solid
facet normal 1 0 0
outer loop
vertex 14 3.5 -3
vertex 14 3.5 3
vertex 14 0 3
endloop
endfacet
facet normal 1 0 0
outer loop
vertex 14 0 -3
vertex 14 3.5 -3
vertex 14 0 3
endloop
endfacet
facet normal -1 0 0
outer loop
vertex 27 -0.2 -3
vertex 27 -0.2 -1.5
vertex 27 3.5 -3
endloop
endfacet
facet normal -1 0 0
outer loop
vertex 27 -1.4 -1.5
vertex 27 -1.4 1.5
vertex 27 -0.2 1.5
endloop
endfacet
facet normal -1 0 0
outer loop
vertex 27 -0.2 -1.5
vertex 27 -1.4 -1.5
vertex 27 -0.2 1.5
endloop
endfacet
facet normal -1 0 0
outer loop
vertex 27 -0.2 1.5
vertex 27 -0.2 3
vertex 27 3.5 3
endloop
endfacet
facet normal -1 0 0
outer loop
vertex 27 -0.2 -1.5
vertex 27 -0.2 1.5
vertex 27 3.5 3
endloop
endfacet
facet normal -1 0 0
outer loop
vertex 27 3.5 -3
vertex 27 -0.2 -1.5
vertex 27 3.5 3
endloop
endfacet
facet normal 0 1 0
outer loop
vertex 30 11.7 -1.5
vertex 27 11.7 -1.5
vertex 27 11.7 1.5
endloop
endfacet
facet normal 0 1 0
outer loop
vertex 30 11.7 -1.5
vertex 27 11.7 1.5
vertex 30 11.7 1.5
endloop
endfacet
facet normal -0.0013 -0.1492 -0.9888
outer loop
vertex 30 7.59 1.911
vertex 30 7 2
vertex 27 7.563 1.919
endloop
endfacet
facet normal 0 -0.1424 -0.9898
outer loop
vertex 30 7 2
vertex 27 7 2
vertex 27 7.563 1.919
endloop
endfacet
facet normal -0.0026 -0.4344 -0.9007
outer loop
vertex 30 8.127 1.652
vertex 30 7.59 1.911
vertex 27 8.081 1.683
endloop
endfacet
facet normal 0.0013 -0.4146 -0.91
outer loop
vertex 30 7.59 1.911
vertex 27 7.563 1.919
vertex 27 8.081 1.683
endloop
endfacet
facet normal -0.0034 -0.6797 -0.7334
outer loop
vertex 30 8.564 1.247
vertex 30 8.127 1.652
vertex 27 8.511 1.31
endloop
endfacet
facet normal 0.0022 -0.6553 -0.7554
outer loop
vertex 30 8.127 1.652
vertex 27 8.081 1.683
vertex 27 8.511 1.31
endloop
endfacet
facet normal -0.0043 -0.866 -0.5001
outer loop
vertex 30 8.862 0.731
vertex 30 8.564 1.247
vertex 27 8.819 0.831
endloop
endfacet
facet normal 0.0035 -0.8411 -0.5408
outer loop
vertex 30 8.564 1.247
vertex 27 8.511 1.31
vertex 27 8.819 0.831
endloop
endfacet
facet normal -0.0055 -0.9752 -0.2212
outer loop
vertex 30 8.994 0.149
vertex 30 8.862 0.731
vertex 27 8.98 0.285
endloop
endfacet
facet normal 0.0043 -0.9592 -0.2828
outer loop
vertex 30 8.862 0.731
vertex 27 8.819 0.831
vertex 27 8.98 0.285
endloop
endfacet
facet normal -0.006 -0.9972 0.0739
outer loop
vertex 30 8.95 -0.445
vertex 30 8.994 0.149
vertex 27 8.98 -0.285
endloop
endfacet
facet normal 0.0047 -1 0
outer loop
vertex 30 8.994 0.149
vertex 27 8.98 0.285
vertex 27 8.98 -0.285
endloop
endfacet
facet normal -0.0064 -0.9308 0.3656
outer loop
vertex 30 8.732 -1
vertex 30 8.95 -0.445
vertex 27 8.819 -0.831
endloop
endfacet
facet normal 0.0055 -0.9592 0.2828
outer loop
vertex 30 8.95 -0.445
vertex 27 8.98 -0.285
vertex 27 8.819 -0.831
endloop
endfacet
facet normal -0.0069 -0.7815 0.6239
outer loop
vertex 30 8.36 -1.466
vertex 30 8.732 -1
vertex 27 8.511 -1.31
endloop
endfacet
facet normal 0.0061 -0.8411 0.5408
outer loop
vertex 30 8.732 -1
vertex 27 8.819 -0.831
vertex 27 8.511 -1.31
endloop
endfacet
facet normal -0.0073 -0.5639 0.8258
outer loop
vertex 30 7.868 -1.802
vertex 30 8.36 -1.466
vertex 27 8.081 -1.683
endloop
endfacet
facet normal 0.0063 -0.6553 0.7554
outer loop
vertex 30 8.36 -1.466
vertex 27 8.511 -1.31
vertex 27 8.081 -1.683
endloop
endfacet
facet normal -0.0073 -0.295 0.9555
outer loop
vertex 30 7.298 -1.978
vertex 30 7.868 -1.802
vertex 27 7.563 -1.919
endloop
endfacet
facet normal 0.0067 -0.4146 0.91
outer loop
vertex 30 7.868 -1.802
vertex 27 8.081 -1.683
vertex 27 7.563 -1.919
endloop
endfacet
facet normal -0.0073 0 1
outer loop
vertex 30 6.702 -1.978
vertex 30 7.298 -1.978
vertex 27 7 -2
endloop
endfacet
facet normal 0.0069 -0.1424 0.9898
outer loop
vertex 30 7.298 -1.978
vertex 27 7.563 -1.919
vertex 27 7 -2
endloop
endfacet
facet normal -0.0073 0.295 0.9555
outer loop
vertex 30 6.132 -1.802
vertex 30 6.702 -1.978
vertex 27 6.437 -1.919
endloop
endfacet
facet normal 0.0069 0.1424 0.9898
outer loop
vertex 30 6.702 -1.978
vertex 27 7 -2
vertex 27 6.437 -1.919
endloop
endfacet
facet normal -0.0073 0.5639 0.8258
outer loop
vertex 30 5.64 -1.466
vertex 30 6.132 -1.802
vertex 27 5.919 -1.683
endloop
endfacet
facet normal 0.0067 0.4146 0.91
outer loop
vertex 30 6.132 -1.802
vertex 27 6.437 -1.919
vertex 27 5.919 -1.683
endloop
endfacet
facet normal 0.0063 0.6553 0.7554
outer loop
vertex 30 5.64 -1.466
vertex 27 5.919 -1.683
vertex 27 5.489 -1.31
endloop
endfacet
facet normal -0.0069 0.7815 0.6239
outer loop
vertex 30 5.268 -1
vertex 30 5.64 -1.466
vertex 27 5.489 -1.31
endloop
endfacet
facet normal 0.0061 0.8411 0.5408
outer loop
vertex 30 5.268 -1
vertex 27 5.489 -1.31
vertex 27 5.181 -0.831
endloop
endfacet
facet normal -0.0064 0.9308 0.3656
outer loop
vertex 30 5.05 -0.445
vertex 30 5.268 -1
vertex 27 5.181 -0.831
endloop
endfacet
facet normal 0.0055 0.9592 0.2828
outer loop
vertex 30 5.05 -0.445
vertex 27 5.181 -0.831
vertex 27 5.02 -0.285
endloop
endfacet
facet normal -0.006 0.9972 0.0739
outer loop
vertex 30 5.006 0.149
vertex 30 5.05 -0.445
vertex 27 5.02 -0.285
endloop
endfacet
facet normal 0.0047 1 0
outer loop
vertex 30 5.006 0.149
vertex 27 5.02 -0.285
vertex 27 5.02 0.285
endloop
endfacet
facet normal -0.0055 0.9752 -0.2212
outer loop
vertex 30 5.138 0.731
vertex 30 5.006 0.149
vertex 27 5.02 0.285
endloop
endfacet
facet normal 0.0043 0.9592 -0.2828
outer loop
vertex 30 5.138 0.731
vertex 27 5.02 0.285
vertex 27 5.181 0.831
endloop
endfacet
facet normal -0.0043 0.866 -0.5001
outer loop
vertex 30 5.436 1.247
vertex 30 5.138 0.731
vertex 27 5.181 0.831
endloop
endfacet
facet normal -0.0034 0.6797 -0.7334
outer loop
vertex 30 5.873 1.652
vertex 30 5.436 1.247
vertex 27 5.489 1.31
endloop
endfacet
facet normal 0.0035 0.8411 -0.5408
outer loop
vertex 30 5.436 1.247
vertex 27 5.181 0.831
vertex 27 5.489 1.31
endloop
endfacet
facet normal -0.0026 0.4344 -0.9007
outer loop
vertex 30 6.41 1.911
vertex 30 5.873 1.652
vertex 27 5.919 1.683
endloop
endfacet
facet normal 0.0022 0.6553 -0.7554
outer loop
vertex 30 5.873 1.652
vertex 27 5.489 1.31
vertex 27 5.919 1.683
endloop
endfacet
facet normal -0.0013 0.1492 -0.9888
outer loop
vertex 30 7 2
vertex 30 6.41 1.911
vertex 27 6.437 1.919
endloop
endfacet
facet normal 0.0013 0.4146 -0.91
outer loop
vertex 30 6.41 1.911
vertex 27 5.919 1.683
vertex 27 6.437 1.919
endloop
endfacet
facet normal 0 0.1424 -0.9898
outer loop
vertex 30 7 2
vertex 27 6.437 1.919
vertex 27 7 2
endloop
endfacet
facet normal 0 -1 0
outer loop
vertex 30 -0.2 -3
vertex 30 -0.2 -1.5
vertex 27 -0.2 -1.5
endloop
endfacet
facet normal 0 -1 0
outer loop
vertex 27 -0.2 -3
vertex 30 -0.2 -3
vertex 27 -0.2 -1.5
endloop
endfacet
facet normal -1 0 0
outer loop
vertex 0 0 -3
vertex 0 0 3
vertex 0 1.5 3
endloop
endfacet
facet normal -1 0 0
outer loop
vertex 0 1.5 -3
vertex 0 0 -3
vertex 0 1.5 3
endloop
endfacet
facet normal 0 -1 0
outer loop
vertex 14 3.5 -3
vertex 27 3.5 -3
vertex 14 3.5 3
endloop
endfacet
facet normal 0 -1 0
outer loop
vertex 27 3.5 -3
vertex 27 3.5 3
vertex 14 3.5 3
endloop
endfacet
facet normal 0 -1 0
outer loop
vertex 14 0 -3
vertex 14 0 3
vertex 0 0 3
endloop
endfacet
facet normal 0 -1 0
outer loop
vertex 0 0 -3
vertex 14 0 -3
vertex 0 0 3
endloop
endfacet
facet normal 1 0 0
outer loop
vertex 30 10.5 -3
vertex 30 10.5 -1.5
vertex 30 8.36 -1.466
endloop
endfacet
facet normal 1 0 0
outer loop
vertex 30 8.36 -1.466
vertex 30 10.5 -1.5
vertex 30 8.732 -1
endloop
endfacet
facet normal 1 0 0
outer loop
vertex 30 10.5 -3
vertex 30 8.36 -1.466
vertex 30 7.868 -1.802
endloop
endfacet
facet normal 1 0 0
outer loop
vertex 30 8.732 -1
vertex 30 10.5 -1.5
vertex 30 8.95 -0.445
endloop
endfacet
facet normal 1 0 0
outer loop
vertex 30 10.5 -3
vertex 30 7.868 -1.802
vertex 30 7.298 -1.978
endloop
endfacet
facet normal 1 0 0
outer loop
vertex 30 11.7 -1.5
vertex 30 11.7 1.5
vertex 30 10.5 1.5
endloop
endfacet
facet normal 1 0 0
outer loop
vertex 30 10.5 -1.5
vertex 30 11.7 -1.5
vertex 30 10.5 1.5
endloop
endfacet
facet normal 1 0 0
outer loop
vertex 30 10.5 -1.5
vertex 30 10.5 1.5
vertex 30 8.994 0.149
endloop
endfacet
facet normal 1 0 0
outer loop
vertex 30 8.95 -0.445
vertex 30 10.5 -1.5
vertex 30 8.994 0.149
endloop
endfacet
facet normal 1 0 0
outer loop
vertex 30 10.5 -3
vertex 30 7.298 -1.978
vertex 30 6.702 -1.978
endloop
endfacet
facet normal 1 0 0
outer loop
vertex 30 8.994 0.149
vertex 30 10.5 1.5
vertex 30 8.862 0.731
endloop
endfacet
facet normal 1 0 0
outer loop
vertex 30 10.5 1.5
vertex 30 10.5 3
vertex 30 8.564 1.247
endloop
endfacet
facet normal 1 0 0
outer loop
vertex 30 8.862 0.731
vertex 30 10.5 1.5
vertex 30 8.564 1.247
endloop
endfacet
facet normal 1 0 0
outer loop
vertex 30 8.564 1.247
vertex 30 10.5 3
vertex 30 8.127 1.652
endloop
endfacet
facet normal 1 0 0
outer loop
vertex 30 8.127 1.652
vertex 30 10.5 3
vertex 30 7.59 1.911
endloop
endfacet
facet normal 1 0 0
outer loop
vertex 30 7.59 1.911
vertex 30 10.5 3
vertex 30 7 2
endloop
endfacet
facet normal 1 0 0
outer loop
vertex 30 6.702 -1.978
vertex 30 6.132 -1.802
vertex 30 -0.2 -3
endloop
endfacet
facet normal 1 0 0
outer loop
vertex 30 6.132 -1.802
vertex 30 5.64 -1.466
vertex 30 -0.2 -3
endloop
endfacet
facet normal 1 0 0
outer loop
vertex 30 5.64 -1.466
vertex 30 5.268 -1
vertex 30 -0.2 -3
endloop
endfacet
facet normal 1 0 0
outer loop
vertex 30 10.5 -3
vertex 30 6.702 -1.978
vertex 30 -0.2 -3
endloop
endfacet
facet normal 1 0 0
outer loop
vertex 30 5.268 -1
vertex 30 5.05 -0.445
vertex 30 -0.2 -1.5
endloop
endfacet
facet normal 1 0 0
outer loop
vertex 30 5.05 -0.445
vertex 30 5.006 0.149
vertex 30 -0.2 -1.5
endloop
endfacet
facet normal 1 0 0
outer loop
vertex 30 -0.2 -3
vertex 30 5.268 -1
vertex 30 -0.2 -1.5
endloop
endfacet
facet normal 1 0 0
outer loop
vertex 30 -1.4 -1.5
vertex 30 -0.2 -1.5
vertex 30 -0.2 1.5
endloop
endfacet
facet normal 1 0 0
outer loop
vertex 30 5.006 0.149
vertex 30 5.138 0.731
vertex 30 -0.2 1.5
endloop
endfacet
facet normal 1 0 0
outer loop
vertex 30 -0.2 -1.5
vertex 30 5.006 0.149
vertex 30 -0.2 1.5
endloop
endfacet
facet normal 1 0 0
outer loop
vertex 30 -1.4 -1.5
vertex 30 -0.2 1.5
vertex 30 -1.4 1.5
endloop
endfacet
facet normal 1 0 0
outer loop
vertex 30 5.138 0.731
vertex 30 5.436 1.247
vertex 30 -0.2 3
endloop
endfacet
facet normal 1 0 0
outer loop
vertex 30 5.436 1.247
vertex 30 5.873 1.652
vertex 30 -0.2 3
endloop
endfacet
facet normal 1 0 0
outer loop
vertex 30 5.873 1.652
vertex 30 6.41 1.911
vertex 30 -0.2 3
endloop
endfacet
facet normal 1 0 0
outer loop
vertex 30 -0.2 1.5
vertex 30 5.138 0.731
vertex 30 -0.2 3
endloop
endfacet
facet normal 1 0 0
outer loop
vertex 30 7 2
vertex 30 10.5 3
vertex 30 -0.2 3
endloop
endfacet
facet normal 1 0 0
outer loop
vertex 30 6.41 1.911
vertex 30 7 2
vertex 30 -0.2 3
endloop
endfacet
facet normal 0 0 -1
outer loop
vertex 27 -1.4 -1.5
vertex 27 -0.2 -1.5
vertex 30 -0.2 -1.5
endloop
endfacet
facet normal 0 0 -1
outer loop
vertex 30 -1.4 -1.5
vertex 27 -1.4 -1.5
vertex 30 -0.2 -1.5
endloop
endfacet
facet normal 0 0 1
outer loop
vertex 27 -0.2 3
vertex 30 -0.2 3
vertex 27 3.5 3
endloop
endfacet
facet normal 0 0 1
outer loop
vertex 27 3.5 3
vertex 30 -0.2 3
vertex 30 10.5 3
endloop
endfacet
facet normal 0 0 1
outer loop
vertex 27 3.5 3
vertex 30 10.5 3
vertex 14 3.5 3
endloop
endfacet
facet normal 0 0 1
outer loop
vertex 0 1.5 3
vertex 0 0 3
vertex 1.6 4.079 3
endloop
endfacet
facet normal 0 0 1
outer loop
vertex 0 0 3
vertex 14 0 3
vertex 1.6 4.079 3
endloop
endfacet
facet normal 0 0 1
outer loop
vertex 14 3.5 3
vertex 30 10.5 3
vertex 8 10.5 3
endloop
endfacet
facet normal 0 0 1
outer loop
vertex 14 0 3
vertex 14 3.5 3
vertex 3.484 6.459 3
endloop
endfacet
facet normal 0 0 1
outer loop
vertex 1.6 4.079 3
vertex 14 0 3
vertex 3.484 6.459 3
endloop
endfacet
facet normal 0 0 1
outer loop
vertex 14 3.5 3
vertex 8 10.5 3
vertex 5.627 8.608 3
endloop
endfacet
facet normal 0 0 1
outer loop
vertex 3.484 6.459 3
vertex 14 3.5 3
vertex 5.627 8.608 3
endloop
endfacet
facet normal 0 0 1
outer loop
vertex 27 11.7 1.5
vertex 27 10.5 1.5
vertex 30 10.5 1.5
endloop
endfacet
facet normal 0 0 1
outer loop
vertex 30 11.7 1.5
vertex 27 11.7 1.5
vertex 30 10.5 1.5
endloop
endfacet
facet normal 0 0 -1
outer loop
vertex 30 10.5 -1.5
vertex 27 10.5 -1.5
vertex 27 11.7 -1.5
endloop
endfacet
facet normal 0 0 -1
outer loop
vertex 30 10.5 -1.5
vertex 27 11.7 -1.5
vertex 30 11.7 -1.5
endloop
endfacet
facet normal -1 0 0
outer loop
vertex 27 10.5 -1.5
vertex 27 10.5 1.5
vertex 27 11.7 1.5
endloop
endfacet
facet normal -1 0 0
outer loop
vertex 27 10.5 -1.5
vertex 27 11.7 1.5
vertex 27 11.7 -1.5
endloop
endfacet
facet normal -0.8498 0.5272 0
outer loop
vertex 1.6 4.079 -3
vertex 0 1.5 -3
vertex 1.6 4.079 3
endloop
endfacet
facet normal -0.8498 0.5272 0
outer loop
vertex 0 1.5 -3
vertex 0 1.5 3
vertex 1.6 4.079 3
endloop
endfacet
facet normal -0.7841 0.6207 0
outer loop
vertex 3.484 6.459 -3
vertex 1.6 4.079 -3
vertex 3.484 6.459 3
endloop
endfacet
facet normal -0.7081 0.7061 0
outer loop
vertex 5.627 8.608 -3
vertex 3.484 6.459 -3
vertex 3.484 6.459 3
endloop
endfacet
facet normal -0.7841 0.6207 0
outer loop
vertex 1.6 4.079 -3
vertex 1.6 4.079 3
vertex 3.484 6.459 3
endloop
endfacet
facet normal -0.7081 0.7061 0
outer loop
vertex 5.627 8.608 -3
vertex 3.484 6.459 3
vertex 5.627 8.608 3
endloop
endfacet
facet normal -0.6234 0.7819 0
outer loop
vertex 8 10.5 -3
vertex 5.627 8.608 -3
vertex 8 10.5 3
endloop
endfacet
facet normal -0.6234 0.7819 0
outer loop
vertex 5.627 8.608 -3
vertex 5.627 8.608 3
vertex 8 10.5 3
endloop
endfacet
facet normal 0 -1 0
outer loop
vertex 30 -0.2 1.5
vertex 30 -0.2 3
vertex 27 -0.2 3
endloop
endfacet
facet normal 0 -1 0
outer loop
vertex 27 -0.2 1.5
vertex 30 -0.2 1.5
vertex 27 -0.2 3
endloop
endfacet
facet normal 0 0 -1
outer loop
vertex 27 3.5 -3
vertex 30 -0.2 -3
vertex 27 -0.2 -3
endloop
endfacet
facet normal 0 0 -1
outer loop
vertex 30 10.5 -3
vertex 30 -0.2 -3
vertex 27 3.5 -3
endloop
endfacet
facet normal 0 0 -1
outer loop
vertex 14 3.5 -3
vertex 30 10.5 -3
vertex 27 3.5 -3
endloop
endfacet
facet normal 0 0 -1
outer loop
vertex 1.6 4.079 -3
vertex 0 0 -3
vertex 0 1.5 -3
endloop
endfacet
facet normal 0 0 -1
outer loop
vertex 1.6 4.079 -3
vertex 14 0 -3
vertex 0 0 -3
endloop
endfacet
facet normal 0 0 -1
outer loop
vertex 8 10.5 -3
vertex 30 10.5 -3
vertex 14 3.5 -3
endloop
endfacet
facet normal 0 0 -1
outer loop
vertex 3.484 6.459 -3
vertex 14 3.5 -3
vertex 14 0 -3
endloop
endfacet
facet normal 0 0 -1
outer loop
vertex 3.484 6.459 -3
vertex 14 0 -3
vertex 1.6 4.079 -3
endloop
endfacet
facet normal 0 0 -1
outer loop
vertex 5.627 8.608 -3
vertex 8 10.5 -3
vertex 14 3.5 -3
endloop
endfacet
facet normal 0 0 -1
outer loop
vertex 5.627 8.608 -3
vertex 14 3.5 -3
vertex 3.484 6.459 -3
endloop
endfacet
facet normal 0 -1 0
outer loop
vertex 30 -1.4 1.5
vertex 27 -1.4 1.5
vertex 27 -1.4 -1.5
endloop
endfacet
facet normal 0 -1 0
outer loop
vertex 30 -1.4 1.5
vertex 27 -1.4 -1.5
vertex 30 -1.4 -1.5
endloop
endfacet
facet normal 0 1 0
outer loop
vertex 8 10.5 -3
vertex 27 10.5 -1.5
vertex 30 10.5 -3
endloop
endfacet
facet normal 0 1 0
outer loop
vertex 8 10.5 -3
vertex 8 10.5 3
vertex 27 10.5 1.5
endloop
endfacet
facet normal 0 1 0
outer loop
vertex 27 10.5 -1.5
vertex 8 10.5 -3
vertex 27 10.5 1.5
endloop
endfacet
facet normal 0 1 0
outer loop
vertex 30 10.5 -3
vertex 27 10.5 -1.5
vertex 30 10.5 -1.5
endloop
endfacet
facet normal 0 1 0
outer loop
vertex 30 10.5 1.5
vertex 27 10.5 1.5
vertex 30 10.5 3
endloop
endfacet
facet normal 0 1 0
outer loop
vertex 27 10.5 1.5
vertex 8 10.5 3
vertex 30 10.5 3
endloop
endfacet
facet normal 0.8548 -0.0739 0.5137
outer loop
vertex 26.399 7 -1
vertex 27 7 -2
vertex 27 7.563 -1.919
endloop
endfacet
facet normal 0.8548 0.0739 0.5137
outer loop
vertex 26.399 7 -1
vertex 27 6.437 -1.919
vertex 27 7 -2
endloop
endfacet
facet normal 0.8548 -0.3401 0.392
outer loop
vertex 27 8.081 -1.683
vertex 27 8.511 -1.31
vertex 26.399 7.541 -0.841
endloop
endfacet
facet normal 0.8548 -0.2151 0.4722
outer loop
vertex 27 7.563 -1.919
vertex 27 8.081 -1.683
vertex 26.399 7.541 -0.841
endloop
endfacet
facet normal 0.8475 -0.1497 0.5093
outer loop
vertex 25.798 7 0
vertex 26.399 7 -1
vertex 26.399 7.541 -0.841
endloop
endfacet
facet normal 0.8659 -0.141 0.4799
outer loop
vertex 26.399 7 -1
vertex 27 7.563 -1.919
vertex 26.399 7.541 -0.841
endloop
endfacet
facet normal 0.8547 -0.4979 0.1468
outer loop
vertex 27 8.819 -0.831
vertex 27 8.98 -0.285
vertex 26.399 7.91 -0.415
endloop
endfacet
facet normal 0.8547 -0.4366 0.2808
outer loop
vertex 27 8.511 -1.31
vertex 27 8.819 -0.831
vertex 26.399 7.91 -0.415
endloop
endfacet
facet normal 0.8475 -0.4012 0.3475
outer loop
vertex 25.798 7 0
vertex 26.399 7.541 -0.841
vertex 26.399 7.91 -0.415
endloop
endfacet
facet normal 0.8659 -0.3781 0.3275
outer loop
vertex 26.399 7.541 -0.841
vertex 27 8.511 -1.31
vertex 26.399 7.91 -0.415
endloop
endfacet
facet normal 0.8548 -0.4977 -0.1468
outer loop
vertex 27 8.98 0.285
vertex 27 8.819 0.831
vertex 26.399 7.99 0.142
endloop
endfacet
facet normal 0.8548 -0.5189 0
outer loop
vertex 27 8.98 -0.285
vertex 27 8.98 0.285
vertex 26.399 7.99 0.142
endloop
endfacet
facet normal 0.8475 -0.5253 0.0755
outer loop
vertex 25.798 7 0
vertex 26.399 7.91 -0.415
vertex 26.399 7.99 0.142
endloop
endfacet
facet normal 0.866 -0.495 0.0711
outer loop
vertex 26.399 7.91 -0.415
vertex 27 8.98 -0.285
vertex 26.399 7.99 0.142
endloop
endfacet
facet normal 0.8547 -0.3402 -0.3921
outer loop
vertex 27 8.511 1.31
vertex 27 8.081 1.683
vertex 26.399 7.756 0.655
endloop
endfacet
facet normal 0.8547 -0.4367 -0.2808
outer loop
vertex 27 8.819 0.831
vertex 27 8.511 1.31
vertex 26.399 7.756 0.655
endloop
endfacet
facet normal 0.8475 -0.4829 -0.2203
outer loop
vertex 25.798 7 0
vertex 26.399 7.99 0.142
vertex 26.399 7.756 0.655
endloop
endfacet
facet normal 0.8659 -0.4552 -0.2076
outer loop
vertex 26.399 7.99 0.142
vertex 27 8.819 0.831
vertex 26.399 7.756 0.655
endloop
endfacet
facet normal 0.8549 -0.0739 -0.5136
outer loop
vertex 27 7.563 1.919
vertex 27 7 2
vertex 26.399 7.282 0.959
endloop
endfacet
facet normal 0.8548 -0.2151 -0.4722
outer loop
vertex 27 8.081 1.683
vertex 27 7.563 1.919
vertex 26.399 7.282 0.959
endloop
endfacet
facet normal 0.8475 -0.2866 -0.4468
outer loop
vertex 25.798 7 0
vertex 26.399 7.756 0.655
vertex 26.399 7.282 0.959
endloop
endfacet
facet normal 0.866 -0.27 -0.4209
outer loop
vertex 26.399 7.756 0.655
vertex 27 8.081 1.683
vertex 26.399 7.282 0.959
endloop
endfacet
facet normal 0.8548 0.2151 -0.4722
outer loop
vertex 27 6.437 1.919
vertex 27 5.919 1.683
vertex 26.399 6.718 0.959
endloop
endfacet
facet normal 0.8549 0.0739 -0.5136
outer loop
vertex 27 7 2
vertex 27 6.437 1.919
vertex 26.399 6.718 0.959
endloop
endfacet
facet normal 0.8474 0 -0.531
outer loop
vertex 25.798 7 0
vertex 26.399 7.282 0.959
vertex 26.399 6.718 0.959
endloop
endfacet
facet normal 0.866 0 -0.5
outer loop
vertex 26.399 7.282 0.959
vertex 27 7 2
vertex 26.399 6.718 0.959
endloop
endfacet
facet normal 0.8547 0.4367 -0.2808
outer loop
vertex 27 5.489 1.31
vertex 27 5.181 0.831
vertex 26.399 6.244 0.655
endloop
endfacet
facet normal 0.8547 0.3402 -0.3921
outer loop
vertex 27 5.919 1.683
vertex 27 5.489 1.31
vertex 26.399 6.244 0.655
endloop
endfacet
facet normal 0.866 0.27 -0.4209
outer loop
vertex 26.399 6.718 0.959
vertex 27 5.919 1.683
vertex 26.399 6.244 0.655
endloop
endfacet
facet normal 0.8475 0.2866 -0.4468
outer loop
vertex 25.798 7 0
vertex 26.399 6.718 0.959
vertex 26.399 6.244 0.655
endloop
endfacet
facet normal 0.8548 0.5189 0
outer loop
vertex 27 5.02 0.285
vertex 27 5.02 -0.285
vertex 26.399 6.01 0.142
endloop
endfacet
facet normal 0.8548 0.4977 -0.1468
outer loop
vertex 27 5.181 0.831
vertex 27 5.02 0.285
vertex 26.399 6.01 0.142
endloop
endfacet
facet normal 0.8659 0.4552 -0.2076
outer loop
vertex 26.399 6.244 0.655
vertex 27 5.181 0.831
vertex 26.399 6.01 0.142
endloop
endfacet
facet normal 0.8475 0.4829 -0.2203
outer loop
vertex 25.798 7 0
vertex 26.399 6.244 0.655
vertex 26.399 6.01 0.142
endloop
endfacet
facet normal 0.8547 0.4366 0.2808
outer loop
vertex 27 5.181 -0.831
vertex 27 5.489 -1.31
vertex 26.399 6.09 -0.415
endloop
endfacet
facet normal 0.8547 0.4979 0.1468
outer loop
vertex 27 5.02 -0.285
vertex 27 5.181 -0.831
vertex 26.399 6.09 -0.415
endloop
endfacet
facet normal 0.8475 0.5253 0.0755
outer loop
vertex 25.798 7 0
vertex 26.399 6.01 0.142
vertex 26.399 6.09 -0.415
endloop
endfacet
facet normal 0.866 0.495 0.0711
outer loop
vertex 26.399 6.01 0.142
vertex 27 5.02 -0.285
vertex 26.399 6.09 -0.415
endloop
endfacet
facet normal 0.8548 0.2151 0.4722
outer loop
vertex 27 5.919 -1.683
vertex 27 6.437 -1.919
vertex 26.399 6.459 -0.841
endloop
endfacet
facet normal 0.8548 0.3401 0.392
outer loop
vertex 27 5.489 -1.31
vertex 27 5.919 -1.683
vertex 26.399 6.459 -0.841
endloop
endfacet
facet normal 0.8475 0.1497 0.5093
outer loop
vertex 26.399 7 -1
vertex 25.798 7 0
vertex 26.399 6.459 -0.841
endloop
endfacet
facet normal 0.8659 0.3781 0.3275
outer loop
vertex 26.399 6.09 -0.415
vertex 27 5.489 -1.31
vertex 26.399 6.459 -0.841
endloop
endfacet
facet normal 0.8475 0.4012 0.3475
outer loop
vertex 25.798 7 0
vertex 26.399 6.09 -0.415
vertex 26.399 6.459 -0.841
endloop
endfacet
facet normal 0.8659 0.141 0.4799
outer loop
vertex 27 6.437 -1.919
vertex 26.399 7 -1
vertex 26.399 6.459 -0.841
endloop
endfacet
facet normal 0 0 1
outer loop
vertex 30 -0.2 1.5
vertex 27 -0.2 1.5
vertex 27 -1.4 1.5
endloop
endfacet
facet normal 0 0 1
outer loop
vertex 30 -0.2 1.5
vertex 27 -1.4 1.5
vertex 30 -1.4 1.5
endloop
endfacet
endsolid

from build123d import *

# Parameters (mm, degrees)
EXTRUSION1_DEPTH                  = 3
ESQUISSE2_W                       = 3
ESQUISSE2_H                       = 3
EXTRUSION2_DEPTH                  = 1.2
ESQUISSE3_W                       = 3
ESQUISSE3_H                       = 3
EXTRUSION3_DEPTH                  = 1.2
DIAM_TRE_DU_PER_AGE_4_0_4_1_D     = 4
DIAM_TRE_DU_PER_AGE_4_0_4_1_DEPTH = 3
DIAM_TRE_DU_PER_AGE_4_0_4_1_TIP   = 1.201721238


with BuildPart() as part:
    # Esquisse1 → Extrusion1 (new body, symmetric)
    with BuildSketch(Plane.XY):
        with BuildLine():
            Line((0, 0), (0, 1.5))
            ThreePointArc((0, 1.5), (3.484063784, 6.45860997), (8, 10.5))
            Line((8, 10.5), (30, 10.5))
            Line((30, 10.5), (30, -0.2))
            Line((30, -0.2), (27, -0.2))
            Line((27, -0.2), (27, 3.5))
            Line((27, 3.5), (14, 3.5))
            Line((14, 3.5), (14, 0))
            Line((14, 0), (0, 0))
        make_face()
    extrude(amount=EXTRUSION1_DEPTH, both=True)

    # Esquisse2 → Extrusion2 (add)
    with BuildSketch(Plane(origin=(0, 10.5, 0), x_dir=(1, 0, 0), z_dir=(0, 1, 0))):
        with Locations((28.5, 0)):
            Rectangle(ESQUISSE2_W, ESQUISSE2_H)
    extrude(amount=EXTRUSION2_DEPTH)

    # Esquisse3 → Extrusion3 (add)
    with BuildSketch(Plane.XZ.offset(0.2)):
        with Locations((28.5, 0)):
            Rectangle(ESQUISSE3_W, ESQUISSE3_H)
    extrude(amount=EXTRUSION3_DEPTH)

    # Diamètre du perçage Ø4.0 (4)1
    with Locations(Plane(origin=(30, 0, 0), x_dir=(0, 0, -1), z_dir=(1, 0, 0))):
        with Locations((0, 7)):
            Hole(DIAM_TRE_DU_PER_AGE_4_0_4_1_D / 2, depth=DIAM_TRE_DU_PER_AGE_4_0_4_1_DEPTH)
            with Locations((0, 0, -(DIAM_TRE_DU_PER_AGE_4_0_4_1_DEPTH + DIAM_TRE_DU_PER_AGE_4_0_4_1_TIP / 2))):  # 118° drill point
                Cone(0, DIAM_TRE_DU_PER_AGE_4_0_4_1_D / 2, DIAM_TRE_DU_PER_AGE_4_0_4_1_TIP, mode=Mode.SUBTRACT)


solid = part.part
